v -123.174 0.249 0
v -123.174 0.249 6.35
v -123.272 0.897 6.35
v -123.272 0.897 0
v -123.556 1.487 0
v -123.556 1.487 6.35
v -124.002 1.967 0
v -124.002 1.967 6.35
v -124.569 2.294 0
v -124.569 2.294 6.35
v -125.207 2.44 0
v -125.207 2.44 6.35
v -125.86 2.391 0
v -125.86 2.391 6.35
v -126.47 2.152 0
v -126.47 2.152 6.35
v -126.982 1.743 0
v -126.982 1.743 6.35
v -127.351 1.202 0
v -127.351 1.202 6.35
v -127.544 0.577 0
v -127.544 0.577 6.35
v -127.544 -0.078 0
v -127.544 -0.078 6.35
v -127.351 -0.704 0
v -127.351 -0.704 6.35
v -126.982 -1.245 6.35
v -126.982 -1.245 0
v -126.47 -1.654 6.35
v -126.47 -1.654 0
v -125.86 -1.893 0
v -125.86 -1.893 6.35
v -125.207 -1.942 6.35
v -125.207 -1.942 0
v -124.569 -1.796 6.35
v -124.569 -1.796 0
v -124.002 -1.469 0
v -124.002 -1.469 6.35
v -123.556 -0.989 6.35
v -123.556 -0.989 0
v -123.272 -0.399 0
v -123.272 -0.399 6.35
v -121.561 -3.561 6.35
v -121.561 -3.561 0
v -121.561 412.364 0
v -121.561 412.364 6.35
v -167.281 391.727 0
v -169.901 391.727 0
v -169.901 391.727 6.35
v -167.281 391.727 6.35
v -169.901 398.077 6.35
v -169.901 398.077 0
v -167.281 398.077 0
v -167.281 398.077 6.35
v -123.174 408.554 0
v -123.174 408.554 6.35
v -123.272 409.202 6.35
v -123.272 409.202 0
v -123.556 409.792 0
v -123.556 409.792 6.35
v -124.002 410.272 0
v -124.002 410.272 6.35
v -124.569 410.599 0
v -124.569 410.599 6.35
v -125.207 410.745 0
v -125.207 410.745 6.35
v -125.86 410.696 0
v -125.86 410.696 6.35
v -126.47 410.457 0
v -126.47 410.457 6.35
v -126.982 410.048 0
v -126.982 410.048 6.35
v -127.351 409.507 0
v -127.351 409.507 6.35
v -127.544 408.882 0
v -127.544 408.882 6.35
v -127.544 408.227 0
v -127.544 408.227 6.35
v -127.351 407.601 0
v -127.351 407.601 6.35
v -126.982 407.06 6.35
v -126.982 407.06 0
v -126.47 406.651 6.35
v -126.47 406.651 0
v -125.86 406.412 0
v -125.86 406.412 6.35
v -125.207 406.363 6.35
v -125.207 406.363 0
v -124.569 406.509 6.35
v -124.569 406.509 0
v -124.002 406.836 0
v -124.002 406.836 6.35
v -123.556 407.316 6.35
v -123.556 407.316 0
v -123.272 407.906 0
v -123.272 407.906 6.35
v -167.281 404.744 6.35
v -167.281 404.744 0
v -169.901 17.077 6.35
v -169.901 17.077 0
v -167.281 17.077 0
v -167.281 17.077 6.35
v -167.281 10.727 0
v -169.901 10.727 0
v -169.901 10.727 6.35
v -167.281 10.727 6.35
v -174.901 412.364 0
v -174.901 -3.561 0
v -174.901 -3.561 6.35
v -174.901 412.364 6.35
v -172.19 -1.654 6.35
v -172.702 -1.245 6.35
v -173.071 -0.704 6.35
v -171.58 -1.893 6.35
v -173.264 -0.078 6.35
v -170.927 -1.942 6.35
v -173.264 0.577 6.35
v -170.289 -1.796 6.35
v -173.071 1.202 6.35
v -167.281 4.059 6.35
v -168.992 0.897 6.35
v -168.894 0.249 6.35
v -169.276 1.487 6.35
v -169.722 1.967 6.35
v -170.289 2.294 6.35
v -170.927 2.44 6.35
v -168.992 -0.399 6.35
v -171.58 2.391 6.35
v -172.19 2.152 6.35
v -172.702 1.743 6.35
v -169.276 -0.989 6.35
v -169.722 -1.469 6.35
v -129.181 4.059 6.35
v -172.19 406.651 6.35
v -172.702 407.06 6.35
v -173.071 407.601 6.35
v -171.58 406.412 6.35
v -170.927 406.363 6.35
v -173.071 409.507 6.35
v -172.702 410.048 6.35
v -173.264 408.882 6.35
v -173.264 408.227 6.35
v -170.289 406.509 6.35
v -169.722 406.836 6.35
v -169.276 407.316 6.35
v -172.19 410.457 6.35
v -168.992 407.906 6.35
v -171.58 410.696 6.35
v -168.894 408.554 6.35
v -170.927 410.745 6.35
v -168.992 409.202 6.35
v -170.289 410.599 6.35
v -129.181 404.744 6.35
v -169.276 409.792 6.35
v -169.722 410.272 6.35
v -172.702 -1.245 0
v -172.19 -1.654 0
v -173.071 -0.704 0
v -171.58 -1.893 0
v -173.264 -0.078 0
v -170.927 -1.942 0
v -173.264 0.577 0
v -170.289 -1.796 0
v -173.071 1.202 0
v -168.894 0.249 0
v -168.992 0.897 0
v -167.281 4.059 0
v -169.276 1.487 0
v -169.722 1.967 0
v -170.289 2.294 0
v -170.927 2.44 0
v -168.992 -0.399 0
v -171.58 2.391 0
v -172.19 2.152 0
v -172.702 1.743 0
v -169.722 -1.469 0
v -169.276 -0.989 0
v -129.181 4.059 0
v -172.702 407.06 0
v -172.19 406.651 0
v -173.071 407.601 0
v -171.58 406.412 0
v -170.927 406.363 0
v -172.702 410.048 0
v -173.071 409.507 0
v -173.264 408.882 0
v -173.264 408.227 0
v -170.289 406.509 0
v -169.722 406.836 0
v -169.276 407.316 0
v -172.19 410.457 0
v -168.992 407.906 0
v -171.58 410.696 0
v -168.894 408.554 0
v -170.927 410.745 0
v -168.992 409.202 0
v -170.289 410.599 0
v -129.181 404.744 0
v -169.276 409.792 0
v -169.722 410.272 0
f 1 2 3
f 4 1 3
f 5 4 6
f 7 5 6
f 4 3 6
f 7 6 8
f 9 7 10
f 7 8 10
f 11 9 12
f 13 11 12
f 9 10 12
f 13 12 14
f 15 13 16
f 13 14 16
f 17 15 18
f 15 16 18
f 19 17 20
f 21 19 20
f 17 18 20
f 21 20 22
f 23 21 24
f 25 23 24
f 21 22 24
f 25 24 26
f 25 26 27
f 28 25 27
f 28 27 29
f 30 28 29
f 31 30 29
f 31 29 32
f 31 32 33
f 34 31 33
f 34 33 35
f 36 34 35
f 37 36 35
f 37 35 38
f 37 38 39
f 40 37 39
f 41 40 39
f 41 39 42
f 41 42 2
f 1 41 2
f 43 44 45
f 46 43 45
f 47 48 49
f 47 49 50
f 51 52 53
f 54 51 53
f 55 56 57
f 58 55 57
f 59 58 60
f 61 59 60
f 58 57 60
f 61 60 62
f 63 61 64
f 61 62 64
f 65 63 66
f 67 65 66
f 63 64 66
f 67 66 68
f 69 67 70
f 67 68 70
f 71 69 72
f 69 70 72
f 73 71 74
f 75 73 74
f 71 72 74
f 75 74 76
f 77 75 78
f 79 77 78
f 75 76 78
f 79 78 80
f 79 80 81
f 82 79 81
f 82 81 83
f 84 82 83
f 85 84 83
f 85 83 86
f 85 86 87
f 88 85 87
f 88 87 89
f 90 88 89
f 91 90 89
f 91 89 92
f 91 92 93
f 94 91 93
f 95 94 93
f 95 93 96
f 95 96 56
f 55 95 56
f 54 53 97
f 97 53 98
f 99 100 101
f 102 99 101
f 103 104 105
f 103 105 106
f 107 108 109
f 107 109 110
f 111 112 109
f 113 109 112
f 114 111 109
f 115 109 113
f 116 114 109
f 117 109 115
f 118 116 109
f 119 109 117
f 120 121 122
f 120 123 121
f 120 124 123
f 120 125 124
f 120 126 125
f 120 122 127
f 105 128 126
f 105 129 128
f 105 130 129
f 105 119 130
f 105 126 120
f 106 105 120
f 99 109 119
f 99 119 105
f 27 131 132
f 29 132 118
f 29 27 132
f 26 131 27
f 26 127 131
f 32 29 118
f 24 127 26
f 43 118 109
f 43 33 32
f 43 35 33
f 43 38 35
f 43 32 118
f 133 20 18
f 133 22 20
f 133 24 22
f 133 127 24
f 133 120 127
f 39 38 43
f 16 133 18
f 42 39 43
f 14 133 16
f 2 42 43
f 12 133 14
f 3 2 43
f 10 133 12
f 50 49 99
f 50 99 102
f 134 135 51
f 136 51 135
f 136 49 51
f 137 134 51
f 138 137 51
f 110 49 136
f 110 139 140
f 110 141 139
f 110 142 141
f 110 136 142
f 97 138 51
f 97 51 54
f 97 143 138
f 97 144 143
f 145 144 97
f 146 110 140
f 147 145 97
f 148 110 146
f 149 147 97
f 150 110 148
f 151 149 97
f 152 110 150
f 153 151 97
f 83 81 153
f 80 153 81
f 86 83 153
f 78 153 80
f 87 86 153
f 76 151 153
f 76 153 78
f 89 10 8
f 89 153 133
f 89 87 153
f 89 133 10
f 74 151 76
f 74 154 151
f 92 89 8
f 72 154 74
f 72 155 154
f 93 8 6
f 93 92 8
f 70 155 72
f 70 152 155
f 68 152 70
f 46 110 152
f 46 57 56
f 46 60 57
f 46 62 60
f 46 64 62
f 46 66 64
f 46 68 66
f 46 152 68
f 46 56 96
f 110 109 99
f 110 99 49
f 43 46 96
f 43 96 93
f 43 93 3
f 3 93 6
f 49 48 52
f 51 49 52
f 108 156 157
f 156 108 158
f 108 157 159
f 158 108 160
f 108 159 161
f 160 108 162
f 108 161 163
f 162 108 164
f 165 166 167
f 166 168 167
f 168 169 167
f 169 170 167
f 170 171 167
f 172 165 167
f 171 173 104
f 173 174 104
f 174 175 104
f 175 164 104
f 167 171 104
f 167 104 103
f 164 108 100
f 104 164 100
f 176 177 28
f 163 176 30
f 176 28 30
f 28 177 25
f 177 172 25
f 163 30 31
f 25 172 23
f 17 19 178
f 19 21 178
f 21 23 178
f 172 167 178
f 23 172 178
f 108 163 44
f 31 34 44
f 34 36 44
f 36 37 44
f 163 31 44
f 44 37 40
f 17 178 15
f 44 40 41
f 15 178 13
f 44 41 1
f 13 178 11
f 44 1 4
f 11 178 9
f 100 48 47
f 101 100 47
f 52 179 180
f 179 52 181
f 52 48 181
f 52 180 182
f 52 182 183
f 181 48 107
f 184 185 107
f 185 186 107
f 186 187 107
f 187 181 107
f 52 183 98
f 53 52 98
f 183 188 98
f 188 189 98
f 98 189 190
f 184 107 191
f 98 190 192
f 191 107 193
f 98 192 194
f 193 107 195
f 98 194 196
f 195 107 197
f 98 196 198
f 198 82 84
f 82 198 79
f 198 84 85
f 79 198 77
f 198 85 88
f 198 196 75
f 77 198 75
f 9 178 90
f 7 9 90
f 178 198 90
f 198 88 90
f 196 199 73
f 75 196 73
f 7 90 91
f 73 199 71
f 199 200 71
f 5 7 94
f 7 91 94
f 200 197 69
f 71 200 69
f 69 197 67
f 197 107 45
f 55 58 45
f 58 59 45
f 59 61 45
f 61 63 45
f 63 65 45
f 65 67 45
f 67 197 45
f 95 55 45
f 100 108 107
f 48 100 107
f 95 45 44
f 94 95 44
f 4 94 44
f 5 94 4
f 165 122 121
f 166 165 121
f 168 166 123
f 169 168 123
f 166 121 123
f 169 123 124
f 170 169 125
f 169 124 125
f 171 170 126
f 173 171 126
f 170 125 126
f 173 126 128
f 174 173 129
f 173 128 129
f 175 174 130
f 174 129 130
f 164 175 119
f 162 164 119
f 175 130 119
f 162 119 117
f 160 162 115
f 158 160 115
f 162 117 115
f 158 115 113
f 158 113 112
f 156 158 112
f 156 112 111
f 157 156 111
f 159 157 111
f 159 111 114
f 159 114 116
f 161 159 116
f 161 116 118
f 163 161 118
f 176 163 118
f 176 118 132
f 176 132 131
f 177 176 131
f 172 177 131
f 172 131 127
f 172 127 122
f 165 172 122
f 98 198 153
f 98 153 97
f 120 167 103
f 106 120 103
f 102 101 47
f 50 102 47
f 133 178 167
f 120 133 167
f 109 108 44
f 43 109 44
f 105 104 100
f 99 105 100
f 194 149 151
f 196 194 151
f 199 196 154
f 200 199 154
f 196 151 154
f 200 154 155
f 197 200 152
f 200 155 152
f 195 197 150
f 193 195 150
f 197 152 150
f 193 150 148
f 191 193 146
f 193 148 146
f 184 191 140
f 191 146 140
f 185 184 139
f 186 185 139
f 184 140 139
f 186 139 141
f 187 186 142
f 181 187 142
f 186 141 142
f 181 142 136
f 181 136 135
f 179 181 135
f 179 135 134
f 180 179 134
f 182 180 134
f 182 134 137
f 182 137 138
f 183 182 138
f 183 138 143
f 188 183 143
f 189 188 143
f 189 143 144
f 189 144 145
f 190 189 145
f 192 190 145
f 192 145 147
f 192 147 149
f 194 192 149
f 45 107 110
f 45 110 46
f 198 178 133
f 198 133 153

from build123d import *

# Parameters (mm, degrees)
SKETCH1_W                   = 53.34
SKETCH1_H                   = 415.925
BOSS_EXTRUDE2_DEPTH         = 6.35
SKETCH2_W                   = 38.1
SKETCH2_H                   = 400.685
CUT_EXTRUDE1_DEPTH          = 448.967600787
F_17_0_173_DIAMETER_HOLE1_D = 4.3942
CUT_EXTRUDE2_DEPTH          = 448.967600787
CUT_EXTRUDE2_DEPTH_BACK     = 448.967600787
SKETCH5_W                   = 2.619375
SKETCH5_H                   = 6.35


with BuildPart() as part:
    # Sketch1 → Boss-Extrude2 (new body)
    with BuildSketch(Plane.XY):
        with Locations((-148.231422107, 204.401588398)):
            Rectangle(SKETCH1_W, SKETCH1_H)
    extrude(amount=BOSS_EXTRUDE2_DEPTH)

    # Sketch2 → Cut-Extrude1 (cut, through all)
    with BuildSketch(Plane(origin=(0, 0, 0), x_dir=(-1, 0, 0), z_dir=(0, 0, -1))):
        with Locations((148.231422107, 204.401588398)):
            Rectangle(SKETCH2_W, SKETCH2_H)
    extrude(amount=-CUT_EXTRUDE1_DEPTH, mode=Mode.SUBTRACT)

    # #17 (0.173) Diameter Hole1 (through all)
    with Locations(Plane(origin=(0, 0, 0), x_dir=(-1, 0, 0), z_dir=(0, 0, -1))):
        with Locations((171.091422107, 408.554088398), (148.231422107, 204.401588398), (171.091422107, 0.249088398), (125.371422107, 408.554088398), (125.371422107, 0.249088398)):
            Hole(F_17_0_173_DIAMETER_HOLE1_D / 2)

    # Sketch5 → Cut-Extrude2 (cut, two sides: drawn at the far end of the back side and taken through both)
    with BuildSketch(Plane.XY.offset(6.35).offset(-CUT_EXTRUDE2_DEPTH_BACK)):
        with Locations((-168.591109607, 394.901588398)):
            Rectangle(SKETCH5_W, SKETCH5_H)
        with Locations((-168.591109607, 13.901588398)):
            Rectangle(SKETCH5_W, SKETCH5_H)
    extrude(amount=CUT_EXTRUDE2_DEPTH + CUT_EXTRUDE2_DEPTH_BACK, mode=Mode.SUBTRACT)


solid = part.part
